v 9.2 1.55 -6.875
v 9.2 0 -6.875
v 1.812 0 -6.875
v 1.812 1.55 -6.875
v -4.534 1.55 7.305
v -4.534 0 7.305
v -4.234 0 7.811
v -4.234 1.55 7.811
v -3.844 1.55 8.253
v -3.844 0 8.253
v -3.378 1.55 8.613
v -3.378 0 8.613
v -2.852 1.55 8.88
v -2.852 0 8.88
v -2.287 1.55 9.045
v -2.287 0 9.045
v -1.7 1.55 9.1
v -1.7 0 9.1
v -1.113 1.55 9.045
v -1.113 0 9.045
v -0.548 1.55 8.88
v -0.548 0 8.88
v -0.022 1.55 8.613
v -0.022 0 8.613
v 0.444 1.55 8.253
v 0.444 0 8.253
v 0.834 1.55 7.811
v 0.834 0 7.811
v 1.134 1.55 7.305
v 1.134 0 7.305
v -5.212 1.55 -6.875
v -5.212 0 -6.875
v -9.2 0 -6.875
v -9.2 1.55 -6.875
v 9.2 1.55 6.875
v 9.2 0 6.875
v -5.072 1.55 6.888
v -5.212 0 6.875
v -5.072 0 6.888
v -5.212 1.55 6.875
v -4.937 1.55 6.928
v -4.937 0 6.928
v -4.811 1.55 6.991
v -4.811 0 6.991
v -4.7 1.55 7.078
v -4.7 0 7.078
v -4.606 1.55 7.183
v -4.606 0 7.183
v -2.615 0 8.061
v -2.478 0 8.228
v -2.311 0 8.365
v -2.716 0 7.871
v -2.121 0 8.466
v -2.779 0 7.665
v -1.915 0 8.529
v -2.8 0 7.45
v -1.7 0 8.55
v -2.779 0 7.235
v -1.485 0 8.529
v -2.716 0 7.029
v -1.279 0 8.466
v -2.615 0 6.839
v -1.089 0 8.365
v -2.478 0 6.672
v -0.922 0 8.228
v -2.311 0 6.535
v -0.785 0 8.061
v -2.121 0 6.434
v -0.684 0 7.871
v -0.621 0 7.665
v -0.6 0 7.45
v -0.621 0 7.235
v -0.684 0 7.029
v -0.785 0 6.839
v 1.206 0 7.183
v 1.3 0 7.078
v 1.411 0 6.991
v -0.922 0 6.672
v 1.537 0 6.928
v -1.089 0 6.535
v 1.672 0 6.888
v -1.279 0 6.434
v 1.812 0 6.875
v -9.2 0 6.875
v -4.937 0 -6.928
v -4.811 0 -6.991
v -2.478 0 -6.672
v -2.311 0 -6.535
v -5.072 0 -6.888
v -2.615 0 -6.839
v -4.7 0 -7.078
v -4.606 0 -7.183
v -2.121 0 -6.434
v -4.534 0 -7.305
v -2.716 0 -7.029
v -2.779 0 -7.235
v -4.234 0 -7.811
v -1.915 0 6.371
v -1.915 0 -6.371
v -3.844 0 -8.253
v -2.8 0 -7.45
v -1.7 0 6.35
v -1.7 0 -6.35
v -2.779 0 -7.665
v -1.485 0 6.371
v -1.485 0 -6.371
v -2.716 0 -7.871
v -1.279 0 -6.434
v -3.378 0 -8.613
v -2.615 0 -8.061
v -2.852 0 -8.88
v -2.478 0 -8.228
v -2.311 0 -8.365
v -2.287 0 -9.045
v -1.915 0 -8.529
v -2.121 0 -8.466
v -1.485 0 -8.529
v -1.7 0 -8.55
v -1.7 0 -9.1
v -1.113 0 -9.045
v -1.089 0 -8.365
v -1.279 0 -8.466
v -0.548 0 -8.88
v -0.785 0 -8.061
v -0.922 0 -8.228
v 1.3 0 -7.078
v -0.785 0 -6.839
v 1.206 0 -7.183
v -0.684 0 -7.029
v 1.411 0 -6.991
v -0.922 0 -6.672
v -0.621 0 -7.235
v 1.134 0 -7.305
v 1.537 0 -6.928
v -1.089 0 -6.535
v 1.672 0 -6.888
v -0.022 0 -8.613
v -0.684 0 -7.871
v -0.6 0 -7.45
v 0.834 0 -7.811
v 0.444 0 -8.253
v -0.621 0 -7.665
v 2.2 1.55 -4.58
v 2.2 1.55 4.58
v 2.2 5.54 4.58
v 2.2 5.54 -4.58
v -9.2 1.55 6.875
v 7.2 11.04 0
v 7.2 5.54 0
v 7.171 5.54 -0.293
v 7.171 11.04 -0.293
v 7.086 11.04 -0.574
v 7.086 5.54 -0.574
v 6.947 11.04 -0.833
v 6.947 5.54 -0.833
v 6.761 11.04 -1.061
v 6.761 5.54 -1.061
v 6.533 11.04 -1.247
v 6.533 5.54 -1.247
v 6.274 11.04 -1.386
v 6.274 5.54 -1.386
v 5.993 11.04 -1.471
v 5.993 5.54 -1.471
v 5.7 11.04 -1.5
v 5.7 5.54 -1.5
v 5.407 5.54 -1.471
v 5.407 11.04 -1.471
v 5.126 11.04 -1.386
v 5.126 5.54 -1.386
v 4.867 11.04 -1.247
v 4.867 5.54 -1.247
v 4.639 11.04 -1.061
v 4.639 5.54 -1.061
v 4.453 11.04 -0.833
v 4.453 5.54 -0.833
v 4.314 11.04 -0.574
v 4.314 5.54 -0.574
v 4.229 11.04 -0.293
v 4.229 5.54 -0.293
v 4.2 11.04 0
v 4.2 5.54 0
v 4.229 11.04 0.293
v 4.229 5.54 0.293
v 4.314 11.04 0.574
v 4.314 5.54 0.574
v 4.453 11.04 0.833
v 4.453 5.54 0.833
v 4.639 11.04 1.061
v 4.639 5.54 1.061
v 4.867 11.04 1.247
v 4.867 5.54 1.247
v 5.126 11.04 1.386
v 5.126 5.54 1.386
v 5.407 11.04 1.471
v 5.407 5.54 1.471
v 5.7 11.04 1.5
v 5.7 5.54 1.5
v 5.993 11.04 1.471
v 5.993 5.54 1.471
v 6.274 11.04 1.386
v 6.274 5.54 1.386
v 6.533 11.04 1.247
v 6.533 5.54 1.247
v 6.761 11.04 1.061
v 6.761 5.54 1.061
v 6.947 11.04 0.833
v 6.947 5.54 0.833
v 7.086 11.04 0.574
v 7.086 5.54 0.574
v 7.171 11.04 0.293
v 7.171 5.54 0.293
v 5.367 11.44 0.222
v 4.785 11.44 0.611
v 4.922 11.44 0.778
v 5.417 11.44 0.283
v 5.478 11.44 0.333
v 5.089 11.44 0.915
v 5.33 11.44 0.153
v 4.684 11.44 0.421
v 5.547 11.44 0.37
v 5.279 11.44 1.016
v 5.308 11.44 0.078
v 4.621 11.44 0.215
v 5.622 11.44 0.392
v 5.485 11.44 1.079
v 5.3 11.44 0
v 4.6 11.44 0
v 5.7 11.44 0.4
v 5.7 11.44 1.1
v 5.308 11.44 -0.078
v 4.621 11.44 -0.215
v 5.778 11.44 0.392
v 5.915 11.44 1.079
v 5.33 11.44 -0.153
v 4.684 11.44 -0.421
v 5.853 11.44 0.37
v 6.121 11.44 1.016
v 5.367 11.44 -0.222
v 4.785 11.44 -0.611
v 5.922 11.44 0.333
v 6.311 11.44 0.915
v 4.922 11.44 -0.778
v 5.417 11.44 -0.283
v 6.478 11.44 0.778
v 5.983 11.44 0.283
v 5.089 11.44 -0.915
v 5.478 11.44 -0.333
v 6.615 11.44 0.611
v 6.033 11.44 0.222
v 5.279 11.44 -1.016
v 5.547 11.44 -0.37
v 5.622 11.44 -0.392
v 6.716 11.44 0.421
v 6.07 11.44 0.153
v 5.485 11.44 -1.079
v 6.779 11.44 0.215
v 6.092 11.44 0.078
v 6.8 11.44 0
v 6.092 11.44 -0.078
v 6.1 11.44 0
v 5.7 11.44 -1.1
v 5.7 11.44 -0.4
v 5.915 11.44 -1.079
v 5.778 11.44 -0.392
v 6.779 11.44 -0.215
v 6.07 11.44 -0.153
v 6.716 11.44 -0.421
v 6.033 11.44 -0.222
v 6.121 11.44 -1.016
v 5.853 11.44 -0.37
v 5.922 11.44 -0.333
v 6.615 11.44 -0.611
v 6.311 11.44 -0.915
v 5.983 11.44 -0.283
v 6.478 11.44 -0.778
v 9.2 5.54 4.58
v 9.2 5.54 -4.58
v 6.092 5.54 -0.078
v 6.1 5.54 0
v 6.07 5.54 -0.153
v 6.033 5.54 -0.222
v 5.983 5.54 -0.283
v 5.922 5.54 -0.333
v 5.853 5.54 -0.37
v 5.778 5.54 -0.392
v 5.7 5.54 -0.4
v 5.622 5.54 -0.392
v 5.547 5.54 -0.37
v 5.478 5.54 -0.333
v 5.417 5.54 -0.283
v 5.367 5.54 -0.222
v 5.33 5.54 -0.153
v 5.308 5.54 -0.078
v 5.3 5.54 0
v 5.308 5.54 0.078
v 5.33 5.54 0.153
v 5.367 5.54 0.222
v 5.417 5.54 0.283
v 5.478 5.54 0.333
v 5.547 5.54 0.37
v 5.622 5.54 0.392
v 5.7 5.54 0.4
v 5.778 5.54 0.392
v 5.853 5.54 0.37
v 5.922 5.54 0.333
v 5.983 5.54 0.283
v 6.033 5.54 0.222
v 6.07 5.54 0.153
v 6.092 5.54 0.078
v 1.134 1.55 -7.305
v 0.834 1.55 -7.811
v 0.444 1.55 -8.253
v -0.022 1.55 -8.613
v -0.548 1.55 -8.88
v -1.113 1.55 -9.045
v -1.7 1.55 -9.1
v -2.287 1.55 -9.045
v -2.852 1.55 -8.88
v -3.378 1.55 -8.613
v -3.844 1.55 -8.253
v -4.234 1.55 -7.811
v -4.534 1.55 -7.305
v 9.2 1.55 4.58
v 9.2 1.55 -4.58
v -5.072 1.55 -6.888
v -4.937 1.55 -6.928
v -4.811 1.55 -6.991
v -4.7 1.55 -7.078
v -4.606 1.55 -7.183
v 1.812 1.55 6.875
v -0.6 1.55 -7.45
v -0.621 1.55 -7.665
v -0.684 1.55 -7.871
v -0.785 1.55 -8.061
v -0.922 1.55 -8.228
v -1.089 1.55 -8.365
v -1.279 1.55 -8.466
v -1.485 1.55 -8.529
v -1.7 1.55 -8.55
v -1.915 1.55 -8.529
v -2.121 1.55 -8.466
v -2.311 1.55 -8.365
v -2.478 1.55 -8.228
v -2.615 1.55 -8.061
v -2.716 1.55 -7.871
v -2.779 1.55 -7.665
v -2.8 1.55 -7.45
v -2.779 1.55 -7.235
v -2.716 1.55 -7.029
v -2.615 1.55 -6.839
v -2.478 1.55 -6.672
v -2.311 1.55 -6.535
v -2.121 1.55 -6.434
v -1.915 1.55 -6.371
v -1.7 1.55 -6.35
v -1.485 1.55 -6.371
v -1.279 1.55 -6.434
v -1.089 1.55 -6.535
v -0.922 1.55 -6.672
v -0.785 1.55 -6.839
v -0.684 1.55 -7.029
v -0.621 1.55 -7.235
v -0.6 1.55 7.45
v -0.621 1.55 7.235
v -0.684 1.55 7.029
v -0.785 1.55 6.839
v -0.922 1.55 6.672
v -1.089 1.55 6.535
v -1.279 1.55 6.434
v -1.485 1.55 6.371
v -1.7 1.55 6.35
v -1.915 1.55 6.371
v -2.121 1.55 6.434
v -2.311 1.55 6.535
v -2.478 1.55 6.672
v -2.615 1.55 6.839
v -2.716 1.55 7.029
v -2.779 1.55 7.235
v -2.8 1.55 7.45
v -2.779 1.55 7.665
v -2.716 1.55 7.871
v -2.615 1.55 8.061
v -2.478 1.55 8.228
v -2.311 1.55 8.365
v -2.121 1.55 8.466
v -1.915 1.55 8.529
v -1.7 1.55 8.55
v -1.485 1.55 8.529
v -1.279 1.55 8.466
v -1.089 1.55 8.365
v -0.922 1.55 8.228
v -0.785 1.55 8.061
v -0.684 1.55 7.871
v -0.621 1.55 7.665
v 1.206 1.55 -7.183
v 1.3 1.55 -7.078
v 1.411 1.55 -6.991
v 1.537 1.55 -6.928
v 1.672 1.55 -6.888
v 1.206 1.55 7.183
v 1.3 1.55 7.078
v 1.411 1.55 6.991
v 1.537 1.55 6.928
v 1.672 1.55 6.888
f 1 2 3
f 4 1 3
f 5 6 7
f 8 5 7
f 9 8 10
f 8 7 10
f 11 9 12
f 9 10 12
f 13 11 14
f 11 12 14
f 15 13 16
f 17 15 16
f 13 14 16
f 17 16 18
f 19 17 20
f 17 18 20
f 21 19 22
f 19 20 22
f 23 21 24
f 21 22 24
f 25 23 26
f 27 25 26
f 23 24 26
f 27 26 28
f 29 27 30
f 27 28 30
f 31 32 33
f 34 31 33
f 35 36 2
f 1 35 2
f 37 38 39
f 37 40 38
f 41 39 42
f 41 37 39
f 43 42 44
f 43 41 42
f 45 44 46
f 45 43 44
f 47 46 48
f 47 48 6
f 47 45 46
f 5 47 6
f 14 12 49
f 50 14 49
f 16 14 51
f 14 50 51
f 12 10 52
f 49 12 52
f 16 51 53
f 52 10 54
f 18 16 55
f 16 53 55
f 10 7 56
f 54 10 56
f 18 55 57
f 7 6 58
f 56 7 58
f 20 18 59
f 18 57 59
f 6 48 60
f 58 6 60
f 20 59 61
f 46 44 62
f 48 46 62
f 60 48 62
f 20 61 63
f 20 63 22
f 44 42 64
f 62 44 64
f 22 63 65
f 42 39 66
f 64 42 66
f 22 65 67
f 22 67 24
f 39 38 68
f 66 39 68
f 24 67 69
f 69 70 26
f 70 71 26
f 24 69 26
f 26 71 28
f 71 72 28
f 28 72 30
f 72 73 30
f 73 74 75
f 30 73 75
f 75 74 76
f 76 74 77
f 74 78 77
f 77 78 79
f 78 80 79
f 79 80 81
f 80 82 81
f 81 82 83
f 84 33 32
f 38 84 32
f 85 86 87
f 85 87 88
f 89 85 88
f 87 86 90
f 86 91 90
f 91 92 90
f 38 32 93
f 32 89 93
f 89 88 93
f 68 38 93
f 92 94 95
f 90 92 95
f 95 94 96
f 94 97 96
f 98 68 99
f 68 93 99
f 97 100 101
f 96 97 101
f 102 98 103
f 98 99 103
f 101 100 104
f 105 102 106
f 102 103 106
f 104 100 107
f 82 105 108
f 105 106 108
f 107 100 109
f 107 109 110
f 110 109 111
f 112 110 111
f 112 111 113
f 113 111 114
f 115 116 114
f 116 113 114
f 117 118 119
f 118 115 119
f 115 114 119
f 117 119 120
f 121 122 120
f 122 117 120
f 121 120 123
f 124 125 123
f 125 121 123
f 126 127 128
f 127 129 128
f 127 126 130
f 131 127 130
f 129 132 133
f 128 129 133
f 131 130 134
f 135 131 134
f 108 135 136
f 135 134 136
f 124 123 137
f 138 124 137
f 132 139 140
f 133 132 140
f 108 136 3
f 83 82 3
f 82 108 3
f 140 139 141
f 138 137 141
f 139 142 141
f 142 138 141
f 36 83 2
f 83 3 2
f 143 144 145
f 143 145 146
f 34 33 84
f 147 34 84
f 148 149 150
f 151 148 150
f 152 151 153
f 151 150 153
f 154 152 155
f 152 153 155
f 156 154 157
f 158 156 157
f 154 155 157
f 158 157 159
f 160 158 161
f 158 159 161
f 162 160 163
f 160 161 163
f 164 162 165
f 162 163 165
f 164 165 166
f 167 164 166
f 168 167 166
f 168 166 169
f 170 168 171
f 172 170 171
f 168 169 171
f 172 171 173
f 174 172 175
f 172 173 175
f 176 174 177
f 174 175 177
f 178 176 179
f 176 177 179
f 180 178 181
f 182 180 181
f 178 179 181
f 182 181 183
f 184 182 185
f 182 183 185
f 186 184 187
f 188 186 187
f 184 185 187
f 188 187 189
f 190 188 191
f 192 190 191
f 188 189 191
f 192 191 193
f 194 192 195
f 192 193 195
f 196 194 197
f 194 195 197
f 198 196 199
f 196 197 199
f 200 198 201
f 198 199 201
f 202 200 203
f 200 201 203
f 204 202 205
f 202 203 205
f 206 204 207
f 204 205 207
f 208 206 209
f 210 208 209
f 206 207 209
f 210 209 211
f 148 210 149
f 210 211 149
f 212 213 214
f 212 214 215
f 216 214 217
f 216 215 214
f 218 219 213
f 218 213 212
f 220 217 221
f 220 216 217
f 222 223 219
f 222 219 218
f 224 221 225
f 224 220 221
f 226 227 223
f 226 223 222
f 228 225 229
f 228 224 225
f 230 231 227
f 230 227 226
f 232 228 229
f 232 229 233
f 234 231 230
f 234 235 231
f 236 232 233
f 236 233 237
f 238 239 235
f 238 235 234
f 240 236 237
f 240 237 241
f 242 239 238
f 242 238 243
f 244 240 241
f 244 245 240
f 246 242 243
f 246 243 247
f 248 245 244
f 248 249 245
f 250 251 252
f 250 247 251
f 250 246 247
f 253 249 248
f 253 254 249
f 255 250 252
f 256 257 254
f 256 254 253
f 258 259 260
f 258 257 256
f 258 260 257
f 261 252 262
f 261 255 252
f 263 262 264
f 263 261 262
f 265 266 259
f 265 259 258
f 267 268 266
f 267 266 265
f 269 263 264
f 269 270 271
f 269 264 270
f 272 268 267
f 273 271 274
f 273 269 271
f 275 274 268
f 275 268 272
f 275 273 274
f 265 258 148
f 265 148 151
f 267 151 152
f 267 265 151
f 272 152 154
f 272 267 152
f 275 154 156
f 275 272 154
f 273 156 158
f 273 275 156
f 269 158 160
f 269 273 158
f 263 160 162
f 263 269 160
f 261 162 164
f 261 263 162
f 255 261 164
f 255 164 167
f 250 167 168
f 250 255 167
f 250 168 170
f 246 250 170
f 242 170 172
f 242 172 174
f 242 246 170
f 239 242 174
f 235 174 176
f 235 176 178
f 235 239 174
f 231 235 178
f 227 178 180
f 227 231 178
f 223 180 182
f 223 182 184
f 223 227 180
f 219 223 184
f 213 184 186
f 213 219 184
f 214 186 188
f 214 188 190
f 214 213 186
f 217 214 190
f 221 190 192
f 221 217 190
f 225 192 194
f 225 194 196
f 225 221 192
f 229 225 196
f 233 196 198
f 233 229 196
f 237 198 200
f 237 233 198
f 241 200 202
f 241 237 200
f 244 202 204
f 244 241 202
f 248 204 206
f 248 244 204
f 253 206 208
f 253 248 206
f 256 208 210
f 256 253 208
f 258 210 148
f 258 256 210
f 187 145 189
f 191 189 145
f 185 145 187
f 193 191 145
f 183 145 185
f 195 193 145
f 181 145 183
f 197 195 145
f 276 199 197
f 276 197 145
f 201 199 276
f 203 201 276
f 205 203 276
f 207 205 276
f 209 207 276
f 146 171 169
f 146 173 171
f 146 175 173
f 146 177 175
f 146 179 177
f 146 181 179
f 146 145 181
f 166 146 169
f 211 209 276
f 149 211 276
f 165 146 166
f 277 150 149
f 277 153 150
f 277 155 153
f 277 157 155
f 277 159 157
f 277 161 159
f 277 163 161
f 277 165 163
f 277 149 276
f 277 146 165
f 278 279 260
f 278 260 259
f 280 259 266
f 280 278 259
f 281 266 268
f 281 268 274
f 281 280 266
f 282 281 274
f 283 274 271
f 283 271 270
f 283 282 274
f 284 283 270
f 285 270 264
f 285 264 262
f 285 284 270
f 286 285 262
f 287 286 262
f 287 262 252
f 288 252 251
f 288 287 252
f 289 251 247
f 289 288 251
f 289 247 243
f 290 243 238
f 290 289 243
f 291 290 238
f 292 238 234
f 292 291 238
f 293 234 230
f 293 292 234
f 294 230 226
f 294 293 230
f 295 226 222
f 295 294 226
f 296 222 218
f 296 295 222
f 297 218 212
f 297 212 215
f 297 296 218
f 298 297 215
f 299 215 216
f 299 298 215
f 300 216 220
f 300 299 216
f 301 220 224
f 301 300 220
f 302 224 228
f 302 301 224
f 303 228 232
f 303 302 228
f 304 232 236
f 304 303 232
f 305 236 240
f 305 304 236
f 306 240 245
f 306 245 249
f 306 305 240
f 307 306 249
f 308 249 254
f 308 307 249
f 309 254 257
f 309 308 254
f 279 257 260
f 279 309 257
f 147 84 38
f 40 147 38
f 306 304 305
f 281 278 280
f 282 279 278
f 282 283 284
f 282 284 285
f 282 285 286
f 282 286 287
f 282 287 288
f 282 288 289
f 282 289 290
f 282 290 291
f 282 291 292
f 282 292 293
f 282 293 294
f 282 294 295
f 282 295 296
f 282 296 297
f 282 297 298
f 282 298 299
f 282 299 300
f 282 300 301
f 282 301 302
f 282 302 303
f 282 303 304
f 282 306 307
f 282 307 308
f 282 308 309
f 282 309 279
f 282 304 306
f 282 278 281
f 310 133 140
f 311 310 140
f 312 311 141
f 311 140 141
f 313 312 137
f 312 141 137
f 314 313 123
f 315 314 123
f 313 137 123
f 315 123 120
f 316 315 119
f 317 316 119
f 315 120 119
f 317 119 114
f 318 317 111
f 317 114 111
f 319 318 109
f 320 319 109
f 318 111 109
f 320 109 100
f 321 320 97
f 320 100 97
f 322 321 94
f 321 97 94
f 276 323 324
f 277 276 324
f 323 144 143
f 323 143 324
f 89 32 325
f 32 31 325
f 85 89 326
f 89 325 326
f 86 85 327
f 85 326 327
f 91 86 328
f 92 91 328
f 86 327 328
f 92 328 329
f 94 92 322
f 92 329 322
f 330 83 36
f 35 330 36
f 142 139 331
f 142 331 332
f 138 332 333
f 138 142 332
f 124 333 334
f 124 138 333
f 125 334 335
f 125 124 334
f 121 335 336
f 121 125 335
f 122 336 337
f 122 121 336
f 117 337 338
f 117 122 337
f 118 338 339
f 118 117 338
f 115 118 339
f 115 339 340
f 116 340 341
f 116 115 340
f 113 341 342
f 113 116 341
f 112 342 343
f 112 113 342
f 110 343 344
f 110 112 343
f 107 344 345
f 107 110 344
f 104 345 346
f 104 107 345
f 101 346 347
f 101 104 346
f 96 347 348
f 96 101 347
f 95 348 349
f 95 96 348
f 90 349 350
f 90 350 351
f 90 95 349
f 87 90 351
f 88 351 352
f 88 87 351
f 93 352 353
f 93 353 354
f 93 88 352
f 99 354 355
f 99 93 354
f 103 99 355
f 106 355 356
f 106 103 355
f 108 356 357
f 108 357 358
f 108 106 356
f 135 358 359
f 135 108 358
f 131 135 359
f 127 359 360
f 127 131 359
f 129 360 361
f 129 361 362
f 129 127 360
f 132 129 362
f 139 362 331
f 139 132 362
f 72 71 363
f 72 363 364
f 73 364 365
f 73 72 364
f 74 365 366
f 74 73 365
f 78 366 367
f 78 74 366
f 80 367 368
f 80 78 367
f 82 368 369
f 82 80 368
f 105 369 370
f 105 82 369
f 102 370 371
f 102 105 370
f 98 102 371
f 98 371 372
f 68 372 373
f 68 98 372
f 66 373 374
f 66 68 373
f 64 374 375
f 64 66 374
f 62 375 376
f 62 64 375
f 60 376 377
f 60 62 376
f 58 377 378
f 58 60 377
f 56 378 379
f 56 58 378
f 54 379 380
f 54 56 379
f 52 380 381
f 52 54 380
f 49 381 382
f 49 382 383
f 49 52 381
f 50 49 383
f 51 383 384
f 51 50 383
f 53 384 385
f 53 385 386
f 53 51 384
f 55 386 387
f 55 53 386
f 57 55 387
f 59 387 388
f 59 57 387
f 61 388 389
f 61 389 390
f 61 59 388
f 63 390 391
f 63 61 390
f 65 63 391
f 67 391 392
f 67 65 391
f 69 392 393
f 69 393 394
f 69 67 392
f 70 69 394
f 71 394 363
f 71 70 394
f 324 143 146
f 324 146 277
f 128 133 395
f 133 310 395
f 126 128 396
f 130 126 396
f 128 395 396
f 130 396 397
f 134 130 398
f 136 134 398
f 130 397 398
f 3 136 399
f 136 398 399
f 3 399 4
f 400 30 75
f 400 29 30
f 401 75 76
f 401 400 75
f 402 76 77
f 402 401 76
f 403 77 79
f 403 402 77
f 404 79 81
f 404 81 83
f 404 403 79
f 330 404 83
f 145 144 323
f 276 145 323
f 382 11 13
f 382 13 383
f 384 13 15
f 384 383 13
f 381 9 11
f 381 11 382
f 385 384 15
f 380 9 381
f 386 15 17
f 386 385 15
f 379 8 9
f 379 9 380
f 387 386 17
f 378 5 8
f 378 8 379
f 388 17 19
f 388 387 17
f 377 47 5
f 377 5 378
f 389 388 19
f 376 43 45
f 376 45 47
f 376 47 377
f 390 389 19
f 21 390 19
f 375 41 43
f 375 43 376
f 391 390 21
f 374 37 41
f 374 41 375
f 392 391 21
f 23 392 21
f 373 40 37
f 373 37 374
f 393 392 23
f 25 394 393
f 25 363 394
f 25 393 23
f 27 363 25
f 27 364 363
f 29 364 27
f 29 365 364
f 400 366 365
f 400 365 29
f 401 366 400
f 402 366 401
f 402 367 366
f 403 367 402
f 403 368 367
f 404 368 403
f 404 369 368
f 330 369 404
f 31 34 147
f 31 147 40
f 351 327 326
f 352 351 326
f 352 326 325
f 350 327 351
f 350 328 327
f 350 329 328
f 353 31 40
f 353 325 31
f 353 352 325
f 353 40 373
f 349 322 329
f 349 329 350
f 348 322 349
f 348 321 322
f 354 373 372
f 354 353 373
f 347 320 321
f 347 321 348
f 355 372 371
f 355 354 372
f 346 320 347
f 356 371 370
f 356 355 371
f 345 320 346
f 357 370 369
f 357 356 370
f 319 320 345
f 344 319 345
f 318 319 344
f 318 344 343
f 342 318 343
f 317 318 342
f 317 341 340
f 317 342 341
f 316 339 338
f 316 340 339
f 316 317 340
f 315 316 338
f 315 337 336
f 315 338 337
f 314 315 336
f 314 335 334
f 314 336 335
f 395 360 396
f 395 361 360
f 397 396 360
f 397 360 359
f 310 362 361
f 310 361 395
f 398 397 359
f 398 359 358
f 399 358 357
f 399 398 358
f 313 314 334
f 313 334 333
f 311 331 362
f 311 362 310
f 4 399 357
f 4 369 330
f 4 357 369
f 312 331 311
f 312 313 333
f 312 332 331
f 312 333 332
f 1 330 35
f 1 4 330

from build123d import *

# Parameters (mm, degrees)
SKETCH1_R           = 1.1
BOSS_EXTRUDE1_DEPTH = 1.55
BOSS_EXTRUDE2_START = 1.55
SKETCH1_3_W         = 7
SKETCH1_3_H         = 9.16
SKETCH1_3_R         = 1.5
SKETCH1_3_R_2       = 0.4
BOSS_EXTRUDE2_DEPTH = 3.99
BOSS_EXTRUDE3_START = 5.54
SKETCH1_4_R         = 1.5
SKETCH1_4_R_2       = 0.4
BOSS_EXTRUDE3_DEPTH = 5.9
CHAMFER1_SIZE       = 0.4
FILLET1_R           = 0.75


with BuildPart() as part:
    # Sketch1 → Boss-Extrude1 (new body)
    with BuildSketch(Plane(origin=(0, 0, 0), x_dir=(1, 0, 0), z_dir=(0, 1, 0))):
        with BuildLine():
            Line((-9.2, 6.875), (-9.2, -6.875))
            Line((-9.2, -6.875), (-4.7, -6.875))
            ThreePointArc((-4.7, -6.875), (-1.7, -9.1), (1.3, -6.875))
            Line((1.3, -6.875), (9.2, -6.875))
            Line((9.2, -6.875), (9.2, 6.875))
            Line((9.2, 6.875), (1.3, 6.875))
            ThreePointArc((1.3, 6.875), (-1.7, 9.1), (-4.7, 6.875))
            Line((-4.7, 6.875), (-9.2, 6.875))
        make_face()
        with Locations((-1.7, 7.45)):
            Circle(SKETCH1_R, mode=Mode.SUBTRACT)
        with Locations((-1.7, -7.45)):
            Circle(SKETCH1_R, mode=Mode.SUBTRACT)
    extrude(amount=BOSS_EXTRUDE1_DEPTH)

    # Fillet1
    fillet1_edges = [part.edges().sort_by_distance(p)[0] for p in [
        (-4.7, 0.775, 6.875),
        (-4.7, 0.775, -6.875),
        (1.3, 0.775, -6.875),
        (1.3, 0.775, 6.875),
    ]]
    fillet(fillet1_edges, radius=FILLET1_R)


with BuildPart() as body_2:
    # Sketch1<3> → Boss-Extrude2 (new body)
    with BuildSketch(Plane(origin=(0, 0, 0), x_dir=(1, 0, 0), z_dir=(0, 1, 0)).offset(BOSS_EXTRUDE2_START)):
        with Locations((5.7, 0)):
            Rectangle(SKETCH1_3_W, SKETCH1_3_H)
        with Locations((5.7, 0)):
            Circle(SKETCH1_3_R, mode=Mode.SUBTRACT)
        with Locations((5.7, 0)):
            Circle(SKETCH1_3_R)
        with Locations((5.7, 0)):
            Circle(SKETCH1_3_R_2, mode=Mode.SUBTRACT)
        with Locations((5.7, 0)):
            Circle(SKETCH1_3_R_2)
    extrude(amount=BOSS_EXTRUDE2_DEPTH)

    # Sketch1<4> → Boss-Extrude3 (add)
    with BuildSketch(Plane(origin=(0, 0, 0), x_dir=(1, 0, 0), z_dir=(0, 1, 0)).offset(BOSS_EXTRUDE3_START)):
        with Locations((5.7, 0)):
            Circle(SKETCH1_4_R)
        with Locations((5.7, 0)):
            Circle(SKETCH1_4_R_2, mode=Mode.SUBTRACT)
    extrude(amount=BOSS_EXTRUDE3_DEPTH)

    # Chamfer1
    chamfer1_edges = [body_2.edges().sort_by_distance(p)[0] for p in [
        (4.2, 11.44, 0),
    ]]
    chamfer(chamfer1_edges, length=CHAMFER1_SIZE)


solid = Compound([part.part, body_2.part])
